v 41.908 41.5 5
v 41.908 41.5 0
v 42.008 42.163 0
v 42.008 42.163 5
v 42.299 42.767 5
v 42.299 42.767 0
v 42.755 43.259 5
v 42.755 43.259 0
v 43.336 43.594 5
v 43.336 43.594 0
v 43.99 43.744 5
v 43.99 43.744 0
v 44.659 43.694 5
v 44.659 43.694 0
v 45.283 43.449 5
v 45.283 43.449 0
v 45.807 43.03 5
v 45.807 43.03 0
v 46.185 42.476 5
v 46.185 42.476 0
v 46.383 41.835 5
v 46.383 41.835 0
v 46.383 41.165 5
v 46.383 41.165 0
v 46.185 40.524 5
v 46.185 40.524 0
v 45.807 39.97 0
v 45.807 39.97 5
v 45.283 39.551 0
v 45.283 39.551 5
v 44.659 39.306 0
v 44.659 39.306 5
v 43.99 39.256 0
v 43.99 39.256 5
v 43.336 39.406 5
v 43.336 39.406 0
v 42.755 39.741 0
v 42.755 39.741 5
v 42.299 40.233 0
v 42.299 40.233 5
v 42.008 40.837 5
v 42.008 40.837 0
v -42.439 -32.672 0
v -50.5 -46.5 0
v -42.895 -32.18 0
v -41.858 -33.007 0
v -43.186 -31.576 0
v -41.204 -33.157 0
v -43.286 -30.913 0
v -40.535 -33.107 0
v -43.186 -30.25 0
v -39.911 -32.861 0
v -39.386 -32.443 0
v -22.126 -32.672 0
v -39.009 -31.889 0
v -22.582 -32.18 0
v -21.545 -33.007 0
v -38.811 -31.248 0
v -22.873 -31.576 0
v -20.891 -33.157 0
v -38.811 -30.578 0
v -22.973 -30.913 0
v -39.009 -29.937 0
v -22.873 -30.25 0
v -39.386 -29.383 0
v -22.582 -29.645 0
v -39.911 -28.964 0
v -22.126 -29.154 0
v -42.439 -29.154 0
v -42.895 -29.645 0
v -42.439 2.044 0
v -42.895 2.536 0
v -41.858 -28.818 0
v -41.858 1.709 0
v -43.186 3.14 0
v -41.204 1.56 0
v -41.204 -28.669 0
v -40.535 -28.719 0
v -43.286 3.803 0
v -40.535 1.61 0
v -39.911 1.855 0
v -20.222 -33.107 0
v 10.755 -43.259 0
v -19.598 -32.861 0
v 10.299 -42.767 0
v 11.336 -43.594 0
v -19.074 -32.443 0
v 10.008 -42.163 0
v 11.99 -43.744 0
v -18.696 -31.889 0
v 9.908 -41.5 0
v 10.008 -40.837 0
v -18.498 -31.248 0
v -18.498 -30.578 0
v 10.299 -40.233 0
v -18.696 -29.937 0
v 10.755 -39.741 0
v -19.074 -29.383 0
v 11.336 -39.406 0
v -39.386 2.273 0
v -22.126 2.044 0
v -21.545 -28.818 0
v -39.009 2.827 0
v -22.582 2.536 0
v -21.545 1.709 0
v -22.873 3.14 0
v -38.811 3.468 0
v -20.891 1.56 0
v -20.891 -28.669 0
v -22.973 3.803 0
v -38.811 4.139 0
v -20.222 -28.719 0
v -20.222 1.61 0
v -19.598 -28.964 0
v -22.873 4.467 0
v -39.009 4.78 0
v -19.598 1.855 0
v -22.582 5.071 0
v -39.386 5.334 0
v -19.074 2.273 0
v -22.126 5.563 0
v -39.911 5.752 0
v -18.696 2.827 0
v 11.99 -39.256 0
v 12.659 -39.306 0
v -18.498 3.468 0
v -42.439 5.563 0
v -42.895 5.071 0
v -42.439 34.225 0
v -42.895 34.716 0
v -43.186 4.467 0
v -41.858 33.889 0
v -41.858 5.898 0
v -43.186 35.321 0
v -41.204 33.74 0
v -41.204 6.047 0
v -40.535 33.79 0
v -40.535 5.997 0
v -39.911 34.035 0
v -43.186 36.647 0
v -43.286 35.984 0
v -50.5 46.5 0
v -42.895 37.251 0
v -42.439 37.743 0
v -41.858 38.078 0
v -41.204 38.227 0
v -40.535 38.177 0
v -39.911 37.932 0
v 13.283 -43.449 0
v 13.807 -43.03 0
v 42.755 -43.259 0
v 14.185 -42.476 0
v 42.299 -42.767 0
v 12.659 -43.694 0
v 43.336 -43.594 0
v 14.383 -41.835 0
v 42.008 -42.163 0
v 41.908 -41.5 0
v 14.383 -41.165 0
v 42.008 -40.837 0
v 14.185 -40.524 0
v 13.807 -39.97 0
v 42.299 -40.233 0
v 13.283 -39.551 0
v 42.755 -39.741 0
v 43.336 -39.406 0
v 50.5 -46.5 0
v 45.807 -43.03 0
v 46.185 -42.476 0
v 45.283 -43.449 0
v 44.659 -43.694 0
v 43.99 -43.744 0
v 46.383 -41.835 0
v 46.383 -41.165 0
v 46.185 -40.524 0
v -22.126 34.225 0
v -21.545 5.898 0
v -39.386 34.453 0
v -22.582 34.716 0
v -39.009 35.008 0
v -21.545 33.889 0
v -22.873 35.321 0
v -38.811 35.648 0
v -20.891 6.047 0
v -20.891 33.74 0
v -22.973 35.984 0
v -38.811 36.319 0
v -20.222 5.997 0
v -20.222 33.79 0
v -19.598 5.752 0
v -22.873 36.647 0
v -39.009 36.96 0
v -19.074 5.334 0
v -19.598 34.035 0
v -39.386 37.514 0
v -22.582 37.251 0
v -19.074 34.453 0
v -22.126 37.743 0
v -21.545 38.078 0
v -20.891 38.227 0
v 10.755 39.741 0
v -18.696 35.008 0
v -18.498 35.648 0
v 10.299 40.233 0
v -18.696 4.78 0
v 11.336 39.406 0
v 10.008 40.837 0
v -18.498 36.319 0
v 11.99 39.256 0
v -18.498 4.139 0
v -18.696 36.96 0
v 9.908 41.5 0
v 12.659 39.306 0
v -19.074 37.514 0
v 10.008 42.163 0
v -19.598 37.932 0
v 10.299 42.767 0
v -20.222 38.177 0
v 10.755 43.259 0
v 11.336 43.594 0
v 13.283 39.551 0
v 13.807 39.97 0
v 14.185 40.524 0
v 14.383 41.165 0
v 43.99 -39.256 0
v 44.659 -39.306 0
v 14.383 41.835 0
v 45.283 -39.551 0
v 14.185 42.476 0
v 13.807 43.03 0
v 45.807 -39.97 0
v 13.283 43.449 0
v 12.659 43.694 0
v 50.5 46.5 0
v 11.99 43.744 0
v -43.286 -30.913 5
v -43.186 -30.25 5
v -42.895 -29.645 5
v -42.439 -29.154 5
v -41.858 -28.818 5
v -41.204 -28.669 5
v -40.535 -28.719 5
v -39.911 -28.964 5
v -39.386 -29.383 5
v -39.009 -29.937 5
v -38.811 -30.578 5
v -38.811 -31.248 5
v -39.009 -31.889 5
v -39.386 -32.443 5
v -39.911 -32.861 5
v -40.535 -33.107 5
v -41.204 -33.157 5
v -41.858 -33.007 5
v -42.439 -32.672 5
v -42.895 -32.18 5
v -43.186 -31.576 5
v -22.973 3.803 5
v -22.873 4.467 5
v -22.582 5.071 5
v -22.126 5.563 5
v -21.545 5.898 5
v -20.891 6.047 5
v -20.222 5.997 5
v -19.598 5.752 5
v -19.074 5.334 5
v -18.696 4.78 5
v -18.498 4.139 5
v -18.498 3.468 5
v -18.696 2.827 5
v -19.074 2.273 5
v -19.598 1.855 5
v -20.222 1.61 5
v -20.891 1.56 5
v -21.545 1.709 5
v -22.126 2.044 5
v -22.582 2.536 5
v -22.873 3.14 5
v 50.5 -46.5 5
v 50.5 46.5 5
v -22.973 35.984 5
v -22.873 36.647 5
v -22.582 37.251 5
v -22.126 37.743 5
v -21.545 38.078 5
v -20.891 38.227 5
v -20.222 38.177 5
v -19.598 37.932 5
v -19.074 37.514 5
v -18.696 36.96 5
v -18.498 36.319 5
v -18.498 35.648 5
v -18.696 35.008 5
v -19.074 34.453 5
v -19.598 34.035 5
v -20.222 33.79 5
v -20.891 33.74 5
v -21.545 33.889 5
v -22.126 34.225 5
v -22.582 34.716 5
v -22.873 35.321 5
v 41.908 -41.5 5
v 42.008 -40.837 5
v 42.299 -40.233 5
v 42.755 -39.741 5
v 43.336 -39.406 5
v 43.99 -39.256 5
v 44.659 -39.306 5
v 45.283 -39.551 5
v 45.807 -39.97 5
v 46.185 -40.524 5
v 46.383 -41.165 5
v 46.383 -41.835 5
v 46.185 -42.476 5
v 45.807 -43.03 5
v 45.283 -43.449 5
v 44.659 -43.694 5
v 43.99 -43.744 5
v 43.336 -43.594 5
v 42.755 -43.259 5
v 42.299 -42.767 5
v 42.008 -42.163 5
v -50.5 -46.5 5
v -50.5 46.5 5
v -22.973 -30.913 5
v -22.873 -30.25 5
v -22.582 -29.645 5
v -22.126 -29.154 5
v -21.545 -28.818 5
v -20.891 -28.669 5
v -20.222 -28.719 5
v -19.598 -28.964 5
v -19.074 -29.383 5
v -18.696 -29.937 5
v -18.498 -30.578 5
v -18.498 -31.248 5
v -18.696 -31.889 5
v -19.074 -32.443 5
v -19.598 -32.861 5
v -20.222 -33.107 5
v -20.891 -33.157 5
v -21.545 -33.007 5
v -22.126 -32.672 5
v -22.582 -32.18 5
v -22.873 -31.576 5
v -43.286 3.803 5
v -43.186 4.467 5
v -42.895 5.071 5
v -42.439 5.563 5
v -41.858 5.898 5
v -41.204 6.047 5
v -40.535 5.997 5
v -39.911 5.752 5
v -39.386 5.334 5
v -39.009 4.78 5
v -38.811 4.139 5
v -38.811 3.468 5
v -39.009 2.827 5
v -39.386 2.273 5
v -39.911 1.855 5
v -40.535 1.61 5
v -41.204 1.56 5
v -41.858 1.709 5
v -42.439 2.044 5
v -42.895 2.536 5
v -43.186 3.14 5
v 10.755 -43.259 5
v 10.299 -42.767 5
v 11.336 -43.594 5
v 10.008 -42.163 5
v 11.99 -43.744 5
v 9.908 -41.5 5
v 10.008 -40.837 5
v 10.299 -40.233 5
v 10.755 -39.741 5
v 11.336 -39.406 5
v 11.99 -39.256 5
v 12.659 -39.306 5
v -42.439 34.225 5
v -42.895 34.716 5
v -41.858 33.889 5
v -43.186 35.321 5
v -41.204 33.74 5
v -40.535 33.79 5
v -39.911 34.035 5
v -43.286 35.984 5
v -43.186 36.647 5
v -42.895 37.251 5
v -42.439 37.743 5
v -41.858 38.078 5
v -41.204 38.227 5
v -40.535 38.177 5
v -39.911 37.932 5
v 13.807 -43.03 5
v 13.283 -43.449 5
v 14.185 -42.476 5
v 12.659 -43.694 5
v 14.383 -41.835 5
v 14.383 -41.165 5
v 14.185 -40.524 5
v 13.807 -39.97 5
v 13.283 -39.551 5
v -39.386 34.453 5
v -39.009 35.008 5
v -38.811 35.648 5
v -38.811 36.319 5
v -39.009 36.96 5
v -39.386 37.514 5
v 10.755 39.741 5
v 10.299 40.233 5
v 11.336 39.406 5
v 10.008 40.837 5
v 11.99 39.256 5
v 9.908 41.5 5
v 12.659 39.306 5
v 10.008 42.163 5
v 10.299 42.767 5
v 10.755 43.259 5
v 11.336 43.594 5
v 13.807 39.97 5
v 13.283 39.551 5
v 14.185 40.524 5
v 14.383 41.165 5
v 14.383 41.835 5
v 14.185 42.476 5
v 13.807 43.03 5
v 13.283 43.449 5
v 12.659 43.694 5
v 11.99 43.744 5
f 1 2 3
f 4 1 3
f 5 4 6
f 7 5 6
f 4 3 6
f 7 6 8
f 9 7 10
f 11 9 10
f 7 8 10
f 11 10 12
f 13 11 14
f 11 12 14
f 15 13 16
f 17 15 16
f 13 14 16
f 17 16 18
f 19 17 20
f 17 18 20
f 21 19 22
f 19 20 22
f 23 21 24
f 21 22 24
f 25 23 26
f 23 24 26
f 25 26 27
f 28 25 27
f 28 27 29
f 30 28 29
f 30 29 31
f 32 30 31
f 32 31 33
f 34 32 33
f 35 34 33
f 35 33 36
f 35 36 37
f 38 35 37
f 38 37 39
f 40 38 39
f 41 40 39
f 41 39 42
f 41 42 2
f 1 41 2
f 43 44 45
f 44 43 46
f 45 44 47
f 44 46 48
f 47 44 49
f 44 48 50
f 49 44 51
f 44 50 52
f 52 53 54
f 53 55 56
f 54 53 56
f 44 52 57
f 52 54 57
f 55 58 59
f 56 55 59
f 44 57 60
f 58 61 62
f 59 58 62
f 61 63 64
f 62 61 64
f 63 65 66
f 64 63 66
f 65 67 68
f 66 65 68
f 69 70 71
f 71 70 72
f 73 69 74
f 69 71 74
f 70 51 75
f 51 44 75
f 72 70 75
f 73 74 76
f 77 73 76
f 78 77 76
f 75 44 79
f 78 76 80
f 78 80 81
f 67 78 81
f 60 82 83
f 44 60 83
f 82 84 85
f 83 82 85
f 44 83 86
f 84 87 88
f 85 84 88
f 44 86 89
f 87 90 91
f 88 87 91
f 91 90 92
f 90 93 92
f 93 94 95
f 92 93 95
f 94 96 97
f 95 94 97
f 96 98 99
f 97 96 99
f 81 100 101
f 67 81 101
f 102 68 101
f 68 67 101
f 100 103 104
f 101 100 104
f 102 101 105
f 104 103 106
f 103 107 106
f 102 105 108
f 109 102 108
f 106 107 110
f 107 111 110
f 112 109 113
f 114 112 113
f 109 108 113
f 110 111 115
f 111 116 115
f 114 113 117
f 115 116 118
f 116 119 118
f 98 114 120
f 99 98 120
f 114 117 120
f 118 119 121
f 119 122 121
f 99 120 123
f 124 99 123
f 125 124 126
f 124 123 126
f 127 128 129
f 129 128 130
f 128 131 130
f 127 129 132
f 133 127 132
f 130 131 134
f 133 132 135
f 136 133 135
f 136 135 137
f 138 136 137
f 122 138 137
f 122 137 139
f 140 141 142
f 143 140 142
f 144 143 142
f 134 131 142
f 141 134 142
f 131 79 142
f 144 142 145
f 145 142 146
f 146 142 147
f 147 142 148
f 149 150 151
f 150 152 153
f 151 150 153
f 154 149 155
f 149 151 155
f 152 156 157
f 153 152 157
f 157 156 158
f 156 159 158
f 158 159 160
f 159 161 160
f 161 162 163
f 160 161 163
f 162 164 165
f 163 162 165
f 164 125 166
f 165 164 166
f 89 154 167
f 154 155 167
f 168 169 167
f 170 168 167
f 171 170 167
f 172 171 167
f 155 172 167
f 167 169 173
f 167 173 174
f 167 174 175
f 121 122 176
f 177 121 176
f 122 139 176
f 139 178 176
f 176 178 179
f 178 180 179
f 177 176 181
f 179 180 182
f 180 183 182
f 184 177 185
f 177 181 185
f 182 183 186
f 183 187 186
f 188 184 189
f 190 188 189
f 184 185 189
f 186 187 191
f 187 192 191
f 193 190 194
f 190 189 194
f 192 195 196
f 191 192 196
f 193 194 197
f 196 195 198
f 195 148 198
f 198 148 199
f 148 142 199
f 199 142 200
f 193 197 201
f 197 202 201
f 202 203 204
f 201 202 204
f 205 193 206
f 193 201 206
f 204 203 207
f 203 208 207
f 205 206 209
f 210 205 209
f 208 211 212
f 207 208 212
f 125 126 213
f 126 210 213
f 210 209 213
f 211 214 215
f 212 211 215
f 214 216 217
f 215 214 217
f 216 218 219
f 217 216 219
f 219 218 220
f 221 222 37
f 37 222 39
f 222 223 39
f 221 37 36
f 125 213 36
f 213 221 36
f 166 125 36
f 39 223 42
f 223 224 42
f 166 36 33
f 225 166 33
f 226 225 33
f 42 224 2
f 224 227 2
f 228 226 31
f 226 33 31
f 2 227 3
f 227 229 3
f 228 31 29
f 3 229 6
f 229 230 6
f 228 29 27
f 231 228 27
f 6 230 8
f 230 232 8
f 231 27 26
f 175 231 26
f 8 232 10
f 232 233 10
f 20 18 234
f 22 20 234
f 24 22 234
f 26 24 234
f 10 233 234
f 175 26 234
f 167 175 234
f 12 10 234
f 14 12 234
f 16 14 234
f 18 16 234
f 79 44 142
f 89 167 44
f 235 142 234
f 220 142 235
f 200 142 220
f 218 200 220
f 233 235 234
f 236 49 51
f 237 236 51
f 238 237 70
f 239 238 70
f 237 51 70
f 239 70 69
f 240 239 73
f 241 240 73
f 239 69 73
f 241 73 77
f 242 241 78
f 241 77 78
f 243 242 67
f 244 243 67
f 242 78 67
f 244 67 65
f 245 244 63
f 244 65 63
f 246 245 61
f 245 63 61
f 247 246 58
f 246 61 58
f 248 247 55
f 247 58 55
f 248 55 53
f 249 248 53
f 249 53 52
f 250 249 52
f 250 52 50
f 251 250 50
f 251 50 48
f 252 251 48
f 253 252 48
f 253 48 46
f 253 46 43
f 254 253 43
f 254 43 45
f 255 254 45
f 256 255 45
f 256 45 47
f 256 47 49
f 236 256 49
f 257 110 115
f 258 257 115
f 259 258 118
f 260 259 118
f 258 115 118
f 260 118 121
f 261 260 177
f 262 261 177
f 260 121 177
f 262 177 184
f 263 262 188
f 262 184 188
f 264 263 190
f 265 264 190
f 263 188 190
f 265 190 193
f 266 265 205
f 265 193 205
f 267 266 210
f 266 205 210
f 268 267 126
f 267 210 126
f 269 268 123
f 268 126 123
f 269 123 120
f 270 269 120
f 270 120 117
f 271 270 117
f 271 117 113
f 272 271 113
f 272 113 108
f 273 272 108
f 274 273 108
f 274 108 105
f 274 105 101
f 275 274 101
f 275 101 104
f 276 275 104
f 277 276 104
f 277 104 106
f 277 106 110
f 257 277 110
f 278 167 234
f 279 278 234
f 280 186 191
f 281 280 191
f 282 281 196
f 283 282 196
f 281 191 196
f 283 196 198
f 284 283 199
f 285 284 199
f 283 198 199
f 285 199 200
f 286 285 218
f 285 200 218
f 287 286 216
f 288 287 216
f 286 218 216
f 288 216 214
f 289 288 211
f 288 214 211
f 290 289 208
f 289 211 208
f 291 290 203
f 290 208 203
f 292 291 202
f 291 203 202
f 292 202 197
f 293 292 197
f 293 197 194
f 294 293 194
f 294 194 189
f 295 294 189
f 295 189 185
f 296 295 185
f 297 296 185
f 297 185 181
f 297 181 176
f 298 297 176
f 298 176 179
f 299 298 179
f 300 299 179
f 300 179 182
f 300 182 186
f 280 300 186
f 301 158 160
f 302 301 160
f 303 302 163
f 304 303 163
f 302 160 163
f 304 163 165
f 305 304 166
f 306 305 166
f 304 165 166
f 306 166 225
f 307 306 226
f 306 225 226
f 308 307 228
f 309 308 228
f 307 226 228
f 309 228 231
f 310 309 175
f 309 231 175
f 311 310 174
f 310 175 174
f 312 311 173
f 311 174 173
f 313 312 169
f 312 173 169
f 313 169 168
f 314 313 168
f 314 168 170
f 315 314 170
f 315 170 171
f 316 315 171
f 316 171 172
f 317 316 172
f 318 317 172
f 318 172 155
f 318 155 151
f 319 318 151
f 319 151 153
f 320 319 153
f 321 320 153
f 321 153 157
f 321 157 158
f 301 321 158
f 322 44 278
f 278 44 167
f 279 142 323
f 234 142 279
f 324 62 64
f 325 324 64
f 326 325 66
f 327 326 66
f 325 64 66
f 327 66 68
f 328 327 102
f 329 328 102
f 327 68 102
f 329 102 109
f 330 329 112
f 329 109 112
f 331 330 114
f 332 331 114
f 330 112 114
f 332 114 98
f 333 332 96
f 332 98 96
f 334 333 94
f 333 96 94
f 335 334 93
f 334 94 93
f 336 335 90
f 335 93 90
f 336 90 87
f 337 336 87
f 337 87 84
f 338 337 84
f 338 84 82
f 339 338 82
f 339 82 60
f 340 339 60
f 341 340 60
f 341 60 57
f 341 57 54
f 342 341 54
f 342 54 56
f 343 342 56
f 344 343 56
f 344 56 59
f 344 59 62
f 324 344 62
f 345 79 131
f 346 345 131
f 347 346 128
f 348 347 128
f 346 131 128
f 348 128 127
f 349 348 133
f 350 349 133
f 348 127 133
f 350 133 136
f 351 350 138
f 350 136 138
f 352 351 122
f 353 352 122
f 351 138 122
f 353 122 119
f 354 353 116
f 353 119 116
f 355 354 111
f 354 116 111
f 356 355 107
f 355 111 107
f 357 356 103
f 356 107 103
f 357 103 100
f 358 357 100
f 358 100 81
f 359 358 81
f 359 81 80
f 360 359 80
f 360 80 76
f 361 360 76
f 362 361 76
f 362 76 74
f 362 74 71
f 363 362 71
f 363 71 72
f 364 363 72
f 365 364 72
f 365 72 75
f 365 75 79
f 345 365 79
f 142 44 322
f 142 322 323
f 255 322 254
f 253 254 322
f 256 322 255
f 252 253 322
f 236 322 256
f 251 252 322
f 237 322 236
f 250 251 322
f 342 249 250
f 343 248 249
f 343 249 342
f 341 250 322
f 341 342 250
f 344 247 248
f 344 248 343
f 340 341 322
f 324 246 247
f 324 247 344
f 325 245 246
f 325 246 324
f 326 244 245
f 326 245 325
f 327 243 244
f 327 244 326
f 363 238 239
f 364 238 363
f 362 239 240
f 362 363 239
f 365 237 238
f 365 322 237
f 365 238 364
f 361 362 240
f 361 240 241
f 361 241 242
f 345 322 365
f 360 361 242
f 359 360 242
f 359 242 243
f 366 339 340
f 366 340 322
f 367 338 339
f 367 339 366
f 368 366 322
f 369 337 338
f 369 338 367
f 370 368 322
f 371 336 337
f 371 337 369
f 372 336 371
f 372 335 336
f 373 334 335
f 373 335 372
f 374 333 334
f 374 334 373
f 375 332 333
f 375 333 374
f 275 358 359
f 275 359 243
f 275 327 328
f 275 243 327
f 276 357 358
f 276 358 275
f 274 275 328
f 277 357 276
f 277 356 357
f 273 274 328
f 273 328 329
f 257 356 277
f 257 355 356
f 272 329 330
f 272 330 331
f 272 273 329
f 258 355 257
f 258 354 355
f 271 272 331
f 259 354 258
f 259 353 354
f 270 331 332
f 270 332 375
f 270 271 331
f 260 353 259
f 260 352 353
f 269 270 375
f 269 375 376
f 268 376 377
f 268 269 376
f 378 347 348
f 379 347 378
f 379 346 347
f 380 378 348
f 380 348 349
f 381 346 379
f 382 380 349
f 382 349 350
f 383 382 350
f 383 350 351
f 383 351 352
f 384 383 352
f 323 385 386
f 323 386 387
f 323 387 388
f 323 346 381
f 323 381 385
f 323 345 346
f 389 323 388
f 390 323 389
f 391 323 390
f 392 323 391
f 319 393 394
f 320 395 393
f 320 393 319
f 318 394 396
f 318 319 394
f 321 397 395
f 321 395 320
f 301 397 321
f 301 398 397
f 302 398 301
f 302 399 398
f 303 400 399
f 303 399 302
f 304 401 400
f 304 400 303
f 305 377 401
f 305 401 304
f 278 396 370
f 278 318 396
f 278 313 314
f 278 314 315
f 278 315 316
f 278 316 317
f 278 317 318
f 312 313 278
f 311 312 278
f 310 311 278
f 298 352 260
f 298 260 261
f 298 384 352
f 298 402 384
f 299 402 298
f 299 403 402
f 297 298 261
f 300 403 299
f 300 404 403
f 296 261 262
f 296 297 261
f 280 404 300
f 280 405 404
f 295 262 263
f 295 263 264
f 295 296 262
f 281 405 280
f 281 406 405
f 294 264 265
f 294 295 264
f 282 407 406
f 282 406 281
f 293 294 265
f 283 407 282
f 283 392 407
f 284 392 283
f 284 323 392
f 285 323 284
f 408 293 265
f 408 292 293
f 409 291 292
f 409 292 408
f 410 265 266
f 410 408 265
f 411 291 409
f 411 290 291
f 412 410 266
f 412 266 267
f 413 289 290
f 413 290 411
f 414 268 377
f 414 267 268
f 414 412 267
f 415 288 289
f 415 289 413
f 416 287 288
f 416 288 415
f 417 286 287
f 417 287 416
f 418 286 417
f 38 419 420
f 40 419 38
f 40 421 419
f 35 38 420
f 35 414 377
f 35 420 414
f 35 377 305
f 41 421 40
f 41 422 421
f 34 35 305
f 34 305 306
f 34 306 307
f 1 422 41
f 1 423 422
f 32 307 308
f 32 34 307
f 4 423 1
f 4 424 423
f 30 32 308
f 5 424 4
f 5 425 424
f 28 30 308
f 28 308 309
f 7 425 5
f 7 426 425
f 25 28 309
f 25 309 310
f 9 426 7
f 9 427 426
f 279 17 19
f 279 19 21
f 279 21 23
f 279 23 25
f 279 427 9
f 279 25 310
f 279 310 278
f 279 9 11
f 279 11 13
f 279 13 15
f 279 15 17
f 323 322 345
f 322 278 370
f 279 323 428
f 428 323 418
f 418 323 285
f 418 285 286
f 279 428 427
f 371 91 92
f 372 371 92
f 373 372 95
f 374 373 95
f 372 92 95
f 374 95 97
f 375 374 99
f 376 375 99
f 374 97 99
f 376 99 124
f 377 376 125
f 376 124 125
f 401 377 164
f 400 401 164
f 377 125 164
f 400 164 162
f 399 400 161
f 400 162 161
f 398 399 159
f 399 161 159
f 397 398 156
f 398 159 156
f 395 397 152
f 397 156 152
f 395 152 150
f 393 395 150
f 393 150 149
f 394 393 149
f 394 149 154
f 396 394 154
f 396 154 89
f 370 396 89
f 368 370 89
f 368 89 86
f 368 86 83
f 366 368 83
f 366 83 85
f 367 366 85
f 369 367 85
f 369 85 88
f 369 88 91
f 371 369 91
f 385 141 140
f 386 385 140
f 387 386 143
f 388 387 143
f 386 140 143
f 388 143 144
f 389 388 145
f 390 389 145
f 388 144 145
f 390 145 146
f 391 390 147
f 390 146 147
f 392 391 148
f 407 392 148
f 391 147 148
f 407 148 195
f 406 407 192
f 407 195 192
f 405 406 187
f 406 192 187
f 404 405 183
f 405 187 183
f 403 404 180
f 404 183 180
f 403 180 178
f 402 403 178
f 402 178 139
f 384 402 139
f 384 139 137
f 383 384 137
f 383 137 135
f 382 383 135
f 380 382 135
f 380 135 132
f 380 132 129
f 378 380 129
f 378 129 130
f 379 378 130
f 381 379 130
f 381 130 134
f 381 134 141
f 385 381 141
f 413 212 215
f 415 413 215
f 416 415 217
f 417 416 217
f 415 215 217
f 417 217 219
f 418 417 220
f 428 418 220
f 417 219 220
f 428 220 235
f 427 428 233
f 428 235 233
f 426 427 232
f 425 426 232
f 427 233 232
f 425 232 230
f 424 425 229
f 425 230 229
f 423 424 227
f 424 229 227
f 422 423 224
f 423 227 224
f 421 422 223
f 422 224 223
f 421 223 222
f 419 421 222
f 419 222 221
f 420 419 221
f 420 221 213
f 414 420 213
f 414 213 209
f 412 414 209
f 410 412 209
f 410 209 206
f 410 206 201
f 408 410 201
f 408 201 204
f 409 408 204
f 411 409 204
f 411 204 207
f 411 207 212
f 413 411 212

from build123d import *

# Parameters (mm, degrees)
ESQUISSE1_W        = 101
ESQUISSE1_H        = 93
BOSS_EXTRU_1_DEPTH = 5
D_GAGEMENT_M41_D   = 4.5
D_GAGEMENT_M42_D   = 4.5


with BuildPart() as part:
    # Esquisse1 → Boss.-Extru.1 (new body)
    with BuildSketch(Plane.XY):
        Rectangle(ESQUISSE1_W, ESQUISSE1_H)
    extrude(amount=BOSS_EXTRU_1_DEPTH)

    # Dégagement M41 (through all)
    with Locations(Plane.XY.offset(5)):
        with Locations((44.157879946, 41.5), (12.157879946, 41.5), (12.157879946, -41.5), (44.157879946, -41.5)):
            Hole(D_GAGEMENT_M41_D / 2)

    # Dégagement M42 (through all)
    with Locations(Plane.XY.offset(5)):
        with Locations((-20.723129893, -30.91293976), (-20.723129893, 3.803464199), (-41.035821543, 3.803464199), (-41.035821543, -30.91293976), (-41.035821543, 35.983767161), (-20.723129893, 35.983767161)):
            Hole(D_GAGEMENT_M42_D / 2)


solid = part.part
